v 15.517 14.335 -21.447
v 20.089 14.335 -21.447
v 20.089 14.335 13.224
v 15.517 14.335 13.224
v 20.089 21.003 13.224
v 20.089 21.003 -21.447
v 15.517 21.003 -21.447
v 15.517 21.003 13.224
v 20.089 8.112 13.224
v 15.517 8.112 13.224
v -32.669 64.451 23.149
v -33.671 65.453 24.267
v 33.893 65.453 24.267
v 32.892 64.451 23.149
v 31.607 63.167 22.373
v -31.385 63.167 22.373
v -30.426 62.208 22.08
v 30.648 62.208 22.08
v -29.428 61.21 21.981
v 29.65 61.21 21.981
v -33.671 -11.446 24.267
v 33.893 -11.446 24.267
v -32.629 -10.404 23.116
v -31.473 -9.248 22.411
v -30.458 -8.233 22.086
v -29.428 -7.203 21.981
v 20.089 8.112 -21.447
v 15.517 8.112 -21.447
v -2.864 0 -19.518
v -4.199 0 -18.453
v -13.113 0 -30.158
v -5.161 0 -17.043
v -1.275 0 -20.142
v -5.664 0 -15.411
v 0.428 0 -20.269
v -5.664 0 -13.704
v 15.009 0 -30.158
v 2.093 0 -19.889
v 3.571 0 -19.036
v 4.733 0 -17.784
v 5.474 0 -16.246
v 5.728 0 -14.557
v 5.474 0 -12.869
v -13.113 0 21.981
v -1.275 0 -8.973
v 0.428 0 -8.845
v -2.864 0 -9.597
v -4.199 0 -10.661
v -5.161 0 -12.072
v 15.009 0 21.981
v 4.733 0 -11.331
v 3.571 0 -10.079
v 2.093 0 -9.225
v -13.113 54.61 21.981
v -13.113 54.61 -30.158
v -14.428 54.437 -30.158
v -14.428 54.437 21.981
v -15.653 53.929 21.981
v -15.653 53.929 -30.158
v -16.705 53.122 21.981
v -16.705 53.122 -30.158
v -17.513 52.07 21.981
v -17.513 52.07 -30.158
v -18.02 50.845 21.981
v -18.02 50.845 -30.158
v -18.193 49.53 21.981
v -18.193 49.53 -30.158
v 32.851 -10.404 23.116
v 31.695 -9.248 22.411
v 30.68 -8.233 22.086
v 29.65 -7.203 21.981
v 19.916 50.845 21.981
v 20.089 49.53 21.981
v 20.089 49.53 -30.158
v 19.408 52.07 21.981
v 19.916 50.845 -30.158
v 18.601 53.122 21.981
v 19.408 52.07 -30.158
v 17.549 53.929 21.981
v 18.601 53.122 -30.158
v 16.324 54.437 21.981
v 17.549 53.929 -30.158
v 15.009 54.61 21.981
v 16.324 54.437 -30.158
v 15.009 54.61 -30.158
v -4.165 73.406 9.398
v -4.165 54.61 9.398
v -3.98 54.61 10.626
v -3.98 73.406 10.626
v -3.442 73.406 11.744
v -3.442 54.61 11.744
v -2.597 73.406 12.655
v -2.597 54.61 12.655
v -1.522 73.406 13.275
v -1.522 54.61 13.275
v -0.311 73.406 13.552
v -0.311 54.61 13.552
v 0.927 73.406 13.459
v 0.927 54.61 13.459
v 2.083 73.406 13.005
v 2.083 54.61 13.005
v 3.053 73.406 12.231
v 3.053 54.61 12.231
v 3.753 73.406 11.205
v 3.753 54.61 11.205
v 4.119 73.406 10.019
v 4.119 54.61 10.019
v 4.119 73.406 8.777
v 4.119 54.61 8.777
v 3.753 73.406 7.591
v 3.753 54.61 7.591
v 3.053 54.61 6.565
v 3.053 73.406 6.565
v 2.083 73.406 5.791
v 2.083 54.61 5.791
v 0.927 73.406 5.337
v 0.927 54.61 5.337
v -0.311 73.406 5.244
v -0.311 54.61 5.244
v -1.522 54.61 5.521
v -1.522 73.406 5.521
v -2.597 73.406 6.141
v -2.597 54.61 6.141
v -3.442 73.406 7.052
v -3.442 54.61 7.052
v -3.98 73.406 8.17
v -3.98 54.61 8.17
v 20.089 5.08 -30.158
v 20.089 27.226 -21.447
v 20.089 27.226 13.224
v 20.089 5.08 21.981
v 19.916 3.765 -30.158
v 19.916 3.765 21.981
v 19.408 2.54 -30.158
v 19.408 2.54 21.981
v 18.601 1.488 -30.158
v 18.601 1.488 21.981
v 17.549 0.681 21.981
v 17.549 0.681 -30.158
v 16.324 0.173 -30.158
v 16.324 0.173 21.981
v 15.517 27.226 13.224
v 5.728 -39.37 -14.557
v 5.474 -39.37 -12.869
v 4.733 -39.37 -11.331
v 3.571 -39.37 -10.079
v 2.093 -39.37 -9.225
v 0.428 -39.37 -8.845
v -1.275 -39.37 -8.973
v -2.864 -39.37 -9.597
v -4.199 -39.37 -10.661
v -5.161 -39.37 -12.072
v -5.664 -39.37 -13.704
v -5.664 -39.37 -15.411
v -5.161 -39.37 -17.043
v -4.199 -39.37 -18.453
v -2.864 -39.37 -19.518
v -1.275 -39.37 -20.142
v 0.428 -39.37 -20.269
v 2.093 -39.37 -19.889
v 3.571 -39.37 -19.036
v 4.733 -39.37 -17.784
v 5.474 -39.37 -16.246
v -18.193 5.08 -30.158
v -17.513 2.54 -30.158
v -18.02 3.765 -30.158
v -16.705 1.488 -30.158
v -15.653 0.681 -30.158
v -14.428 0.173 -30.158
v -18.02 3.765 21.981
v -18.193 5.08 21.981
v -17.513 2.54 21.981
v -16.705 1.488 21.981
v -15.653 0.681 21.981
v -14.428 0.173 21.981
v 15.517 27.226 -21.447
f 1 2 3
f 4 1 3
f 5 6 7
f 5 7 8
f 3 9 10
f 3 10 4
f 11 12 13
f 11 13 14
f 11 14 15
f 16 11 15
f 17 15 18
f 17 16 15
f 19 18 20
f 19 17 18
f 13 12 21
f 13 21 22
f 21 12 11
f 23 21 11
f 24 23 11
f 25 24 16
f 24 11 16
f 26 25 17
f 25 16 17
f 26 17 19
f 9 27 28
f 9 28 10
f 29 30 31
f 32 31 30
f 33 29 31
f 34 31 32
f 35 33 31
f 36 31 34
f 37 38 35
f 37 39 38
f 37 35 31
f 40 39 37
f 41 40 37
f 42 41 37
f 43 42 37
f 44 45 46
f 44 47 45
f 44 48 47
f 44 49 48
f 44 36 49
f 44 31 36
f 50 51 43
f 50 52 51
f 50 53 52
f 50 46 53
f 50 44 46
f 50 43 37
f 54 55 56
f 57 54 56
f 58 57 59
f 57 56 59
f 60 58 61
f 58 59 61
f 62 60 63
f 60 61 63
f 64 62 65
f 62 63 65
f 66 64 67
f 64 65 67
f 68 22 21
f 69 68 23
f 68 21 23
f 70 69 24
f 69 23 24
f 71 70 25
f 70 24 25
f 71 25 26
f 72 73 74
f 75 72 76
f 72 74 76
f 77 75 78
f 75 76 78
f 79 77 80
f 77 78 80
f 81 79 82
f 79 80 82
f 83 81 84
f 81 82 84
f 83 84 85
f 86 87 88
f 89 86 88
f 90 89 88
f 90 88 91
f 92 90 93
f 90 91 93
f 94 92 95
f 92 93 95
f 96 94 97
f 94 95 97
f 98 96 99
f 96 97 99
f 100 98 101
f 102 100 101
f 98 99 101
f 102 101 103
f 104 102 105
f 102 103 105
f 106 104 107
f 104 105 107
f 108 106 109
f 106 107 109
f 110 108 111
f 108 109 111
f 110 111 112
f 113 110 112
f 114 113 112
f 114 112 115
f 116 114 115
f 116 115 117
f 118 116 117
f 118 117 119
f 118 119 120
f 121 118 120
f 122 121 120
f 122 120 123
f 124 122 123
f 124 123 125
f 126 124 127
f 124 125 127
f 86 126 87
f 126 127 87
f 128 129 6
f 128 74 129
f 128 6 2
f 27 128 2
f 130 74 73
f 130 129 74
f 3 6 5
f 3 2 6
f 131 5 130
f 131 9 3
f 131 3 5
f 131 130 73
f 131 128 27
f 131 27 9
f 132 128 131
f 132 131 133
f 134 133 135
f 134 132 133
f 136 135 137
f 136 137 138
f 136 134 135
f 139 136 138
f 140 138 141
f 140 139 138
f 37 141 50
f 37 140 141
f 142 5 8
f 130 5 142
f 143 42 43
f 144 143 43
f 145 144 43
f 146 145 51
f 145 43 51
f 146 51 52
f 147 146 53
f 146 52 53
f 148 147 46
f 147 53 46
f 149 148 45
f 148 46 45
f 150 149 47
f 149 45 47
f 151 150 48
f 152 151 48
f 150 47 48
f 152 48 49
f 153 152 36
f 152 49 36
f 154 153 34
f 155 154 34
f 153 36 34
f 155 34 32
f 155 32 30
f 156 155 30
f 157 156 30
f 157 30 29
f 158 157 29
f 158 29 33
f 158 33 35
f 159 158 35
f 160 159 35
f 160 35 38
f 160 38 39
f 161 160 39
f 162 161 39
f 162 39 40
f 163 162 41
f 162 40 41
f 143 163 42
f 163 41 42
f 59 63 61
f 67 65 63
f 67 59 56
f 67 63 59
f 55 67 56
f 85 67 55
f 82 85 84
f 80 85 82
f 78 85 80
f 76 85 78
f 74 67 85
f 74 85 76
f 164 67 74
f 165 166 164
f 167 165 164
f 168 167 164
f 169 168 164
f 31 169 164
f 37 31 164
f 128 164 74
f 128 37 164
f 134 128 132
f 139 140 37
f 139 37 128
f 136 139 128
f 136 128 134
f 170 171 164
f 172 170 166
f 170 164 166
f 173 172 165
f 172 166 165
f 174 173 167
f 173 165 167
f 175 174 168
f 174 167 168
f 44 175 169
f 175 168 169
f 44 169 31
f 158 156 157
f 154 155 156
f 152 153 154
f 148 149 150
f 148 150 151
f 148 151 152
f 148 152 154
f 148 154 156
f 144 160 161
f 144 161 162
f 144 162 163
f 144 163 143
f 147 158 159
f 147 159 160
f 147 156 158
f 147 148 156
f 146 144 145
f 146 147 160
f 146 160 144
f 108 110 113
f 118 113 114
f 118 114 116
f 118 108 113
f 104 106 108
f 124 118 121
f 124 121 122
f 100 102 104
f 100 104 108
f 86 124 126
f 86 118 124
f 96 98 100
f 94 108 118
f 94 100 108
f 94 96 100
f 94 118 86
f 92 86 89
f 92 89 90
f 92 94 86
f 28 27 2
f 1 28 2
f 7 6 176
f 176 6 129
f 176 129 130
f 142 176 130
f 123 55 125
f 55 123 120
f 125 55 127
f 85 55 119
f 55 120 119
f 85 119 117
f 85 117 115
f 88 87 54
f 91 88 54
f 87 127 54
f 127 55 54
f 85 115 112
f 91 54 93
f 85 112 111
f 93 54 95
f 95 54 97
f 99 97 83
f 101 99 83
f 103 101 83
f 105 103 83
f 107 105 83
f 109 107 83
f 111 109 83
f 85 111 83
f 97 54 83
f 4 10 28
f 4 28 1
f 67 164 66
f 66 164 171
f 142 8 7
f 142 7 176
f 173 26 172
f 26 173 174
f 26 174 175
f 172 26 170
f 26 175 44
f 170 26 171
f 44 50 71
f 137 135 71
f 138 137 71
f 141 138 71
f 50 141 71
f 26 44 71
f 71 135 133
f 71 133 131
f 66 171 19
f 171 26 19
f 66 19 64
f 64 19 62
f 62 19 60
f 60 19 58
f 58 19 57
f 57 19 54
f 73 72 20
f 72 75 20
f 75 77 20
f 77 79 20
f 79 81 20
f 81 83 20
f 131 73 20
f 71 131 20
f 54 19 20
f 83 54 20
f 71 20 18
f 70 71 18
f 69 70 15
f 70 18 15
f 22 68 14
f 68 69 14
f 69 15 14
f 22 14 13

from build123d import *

# Parameters (mm, degrees)
F0_W         = 38.2822398096
F0_H         = 52.1388202906
F1_DEPTH     = 54.61
F2_R         = 5.728059517
F3_DEPTH     = 39.37
F4_W         = 6.2229996547
F4_H         = 34.6710011363
F5_DEPTH     = 4.572
F6_R         = 4.1653363511
F7_DEPTH     = 18.796
F8_W         = 67.563995719
F8_H         = 76.8984956667
F9_DEPTH     = 2.286
F10_T1_DEPTH = 64.8388202906
F10_T3_DEPTH = 88.7771779414
F10_T5_DEPTH = 98.1116778891


# Not quite as in the source:
# - a fillet or chamfer that OpenCascade refuses, or shapes differently, is made with other operations: its cross-section is extruded or revolved along the edge and cut away or added


with BuildPart() as f1:
    # F0 (on Front) → F1 (new body)
    with BuildSketch(Plane.XZ):
        with Locations((0.9477725253, -4.0886364877)):
            Rectangle(F0_W, F0_H)
    extrude(amount=-F1_DEPTH)

    # F2 (on Front) → F3 (join)
    with BuildSketch(Plane.XZ):
        with Locations((0, -14.5573755726)):
            Circle(F2_R)
    extrude(amount=F3_DEPTH)

    # F4 (on face) → F5 (cut)
    with BuildSketch(Plane.YZ.offset(20.0888924301)):
        with Locations((11.2236249261, -4.1116252542)):
            Rectangle(F4_W, F4_H)
        with Locations((24.1141221486, -4.1116252542)):
            Rectangle(F4_W, F4_H)
    extrude(amount=-F5_DEPTH, mode=Mode.SUBTRACT)

    # F6 (on face) → F7 (join)
    with BuildSketch(Plane(origin=(0, 54.61, 0), x_dir=(-1, 0, 0), z_dir=(0, 1, 0))):
        with Locations((0, 9.3980003148)):
            Circle(F6_R)
    extrude(amount=F7_DEPTH)

    # F8 (on face) → F9 (join)
    with BuildSketch(Plane.XY.offset(21.9807736576)):
        with Locations((0.1111254096, 27.0033725537)):
            Rectangle(F8_W, F8_H)
    extrude(amount=F9_DEPTH)

    # F10: fillet of radius 5.08 on 8 edges, made by hand

    # F10_s2 → F10_t1 (cut)
    with BuildSketch(Plane.XY.offset(-42.858046633)):
        with BuildLine():
            ThreePointArc((20.0888924301, 5.08), (18.6009948785, 1.4878975516), (15.0088924301, 0))
            Line((15.0088924301, 0), (20.0888924301, 0))
            Line((20.0888924301, 0), (20.0888924301, 5.08))
        make_face()
        with BuildLine():
            ThreePointArc((-18.1933473796, 5.08), (-16.705449828, 1.4878975516), (-13.1133473796, 0))
            Line((-13.1133473796, 0), (-18.1933473796, 0))
            Line((-18.1933473796, 0), (-18.1933473796, 5.08))
        make_face()
        with BuildLine():
            ThreePointArc((-13.1133473796, 54.61), (-16.705449828, 53.1221024484), (-18.1933473796, 49.53))
            Line((-18.1933473796, 49.53), (-18.1933473796, 54.61))
            Line((-18.1933473796, 54.61), (-13.1133473796, 54.61))
        make_face()
        with BuildLine():
            ThreePointArc((20.0888924301, 49.53), (18.6009948785, 53.1221024484), (15.0088924301, 54.61))
            Line((15.0088924301, 54.61), (20.0888924301, 54.61))
            Line((20.0888924301, 54.61), (20.0888924301, 49.53))
        make_face()
    extrude(amount=F10_T1_DEPTH, mode=Mode.SUBTRACT)

    # F10_s4 → F10_t3 (cut)
    with BuildSketch(Plane.YZ.offset(-44.2774635611)):
        with BuildLine():
            ThreePointArc((65.4526203871, 24.2667736576), (63.6196395196, 22.5886421747), (61.2099839426, 21.9807736576))
            Line((61.2099839426, 21.9807736576), (65.4526203871, 21.9807736576))
            Line((65.4526203871, 21.9807736576), (65.4526203871, 24.2667736576))
        make_face()
        with BuildLine():
            ThreePointArc((-11.4458752796, 24.2667736576), (-9.6128944122, 22.5886421747), (-7.2032388351, 21.9807736576))
            Line((-7.2032388351, 21.9807736576), (-11.4458752796, 21.9807736576))
            Line((-11.4458752796, 21.9807736576), (-11.4458752796, 24.2667736576))
        make_face()
    extrude(amount=F10_T3_DEPTH, mode=Mode.SUBTRACT)

    # F10_s6 → F10_t5 (cut)
    with BuildSketch(Plane.XZ.offset(-76.0592114983)):
        with BuildLine():
            ThreePointArc((29.6504868246, 21.9807736576), (32.0601424016, 22.5886421747), (33.8931232691, 24.2667736576))
            Line((33.8931232691, 24.2667736576), (33.8931232691, 21.9807736576))
            Line((33.8931232691, 21.9807736576), (29.6504868246, 21.9807736576))
        make_face()
        with BuildLine():
            ThreePointArc((-33.6708724499, 24.2667736576), (-31.8378915824, 22.5886421747), (-29.4282360054, 21.9807736576))
            Line((-29.4282360054, 21.9807736576), (-33.6708724499, 21.9807736576))
            Line((-33.6708724499, 21.9807736576), (-33.6708724499, 24.2667736576))
        make_face()
    extrude(amount=F10_T5_DEPTH, mode=Mode.SUBTRACT)


solid = f1.part
